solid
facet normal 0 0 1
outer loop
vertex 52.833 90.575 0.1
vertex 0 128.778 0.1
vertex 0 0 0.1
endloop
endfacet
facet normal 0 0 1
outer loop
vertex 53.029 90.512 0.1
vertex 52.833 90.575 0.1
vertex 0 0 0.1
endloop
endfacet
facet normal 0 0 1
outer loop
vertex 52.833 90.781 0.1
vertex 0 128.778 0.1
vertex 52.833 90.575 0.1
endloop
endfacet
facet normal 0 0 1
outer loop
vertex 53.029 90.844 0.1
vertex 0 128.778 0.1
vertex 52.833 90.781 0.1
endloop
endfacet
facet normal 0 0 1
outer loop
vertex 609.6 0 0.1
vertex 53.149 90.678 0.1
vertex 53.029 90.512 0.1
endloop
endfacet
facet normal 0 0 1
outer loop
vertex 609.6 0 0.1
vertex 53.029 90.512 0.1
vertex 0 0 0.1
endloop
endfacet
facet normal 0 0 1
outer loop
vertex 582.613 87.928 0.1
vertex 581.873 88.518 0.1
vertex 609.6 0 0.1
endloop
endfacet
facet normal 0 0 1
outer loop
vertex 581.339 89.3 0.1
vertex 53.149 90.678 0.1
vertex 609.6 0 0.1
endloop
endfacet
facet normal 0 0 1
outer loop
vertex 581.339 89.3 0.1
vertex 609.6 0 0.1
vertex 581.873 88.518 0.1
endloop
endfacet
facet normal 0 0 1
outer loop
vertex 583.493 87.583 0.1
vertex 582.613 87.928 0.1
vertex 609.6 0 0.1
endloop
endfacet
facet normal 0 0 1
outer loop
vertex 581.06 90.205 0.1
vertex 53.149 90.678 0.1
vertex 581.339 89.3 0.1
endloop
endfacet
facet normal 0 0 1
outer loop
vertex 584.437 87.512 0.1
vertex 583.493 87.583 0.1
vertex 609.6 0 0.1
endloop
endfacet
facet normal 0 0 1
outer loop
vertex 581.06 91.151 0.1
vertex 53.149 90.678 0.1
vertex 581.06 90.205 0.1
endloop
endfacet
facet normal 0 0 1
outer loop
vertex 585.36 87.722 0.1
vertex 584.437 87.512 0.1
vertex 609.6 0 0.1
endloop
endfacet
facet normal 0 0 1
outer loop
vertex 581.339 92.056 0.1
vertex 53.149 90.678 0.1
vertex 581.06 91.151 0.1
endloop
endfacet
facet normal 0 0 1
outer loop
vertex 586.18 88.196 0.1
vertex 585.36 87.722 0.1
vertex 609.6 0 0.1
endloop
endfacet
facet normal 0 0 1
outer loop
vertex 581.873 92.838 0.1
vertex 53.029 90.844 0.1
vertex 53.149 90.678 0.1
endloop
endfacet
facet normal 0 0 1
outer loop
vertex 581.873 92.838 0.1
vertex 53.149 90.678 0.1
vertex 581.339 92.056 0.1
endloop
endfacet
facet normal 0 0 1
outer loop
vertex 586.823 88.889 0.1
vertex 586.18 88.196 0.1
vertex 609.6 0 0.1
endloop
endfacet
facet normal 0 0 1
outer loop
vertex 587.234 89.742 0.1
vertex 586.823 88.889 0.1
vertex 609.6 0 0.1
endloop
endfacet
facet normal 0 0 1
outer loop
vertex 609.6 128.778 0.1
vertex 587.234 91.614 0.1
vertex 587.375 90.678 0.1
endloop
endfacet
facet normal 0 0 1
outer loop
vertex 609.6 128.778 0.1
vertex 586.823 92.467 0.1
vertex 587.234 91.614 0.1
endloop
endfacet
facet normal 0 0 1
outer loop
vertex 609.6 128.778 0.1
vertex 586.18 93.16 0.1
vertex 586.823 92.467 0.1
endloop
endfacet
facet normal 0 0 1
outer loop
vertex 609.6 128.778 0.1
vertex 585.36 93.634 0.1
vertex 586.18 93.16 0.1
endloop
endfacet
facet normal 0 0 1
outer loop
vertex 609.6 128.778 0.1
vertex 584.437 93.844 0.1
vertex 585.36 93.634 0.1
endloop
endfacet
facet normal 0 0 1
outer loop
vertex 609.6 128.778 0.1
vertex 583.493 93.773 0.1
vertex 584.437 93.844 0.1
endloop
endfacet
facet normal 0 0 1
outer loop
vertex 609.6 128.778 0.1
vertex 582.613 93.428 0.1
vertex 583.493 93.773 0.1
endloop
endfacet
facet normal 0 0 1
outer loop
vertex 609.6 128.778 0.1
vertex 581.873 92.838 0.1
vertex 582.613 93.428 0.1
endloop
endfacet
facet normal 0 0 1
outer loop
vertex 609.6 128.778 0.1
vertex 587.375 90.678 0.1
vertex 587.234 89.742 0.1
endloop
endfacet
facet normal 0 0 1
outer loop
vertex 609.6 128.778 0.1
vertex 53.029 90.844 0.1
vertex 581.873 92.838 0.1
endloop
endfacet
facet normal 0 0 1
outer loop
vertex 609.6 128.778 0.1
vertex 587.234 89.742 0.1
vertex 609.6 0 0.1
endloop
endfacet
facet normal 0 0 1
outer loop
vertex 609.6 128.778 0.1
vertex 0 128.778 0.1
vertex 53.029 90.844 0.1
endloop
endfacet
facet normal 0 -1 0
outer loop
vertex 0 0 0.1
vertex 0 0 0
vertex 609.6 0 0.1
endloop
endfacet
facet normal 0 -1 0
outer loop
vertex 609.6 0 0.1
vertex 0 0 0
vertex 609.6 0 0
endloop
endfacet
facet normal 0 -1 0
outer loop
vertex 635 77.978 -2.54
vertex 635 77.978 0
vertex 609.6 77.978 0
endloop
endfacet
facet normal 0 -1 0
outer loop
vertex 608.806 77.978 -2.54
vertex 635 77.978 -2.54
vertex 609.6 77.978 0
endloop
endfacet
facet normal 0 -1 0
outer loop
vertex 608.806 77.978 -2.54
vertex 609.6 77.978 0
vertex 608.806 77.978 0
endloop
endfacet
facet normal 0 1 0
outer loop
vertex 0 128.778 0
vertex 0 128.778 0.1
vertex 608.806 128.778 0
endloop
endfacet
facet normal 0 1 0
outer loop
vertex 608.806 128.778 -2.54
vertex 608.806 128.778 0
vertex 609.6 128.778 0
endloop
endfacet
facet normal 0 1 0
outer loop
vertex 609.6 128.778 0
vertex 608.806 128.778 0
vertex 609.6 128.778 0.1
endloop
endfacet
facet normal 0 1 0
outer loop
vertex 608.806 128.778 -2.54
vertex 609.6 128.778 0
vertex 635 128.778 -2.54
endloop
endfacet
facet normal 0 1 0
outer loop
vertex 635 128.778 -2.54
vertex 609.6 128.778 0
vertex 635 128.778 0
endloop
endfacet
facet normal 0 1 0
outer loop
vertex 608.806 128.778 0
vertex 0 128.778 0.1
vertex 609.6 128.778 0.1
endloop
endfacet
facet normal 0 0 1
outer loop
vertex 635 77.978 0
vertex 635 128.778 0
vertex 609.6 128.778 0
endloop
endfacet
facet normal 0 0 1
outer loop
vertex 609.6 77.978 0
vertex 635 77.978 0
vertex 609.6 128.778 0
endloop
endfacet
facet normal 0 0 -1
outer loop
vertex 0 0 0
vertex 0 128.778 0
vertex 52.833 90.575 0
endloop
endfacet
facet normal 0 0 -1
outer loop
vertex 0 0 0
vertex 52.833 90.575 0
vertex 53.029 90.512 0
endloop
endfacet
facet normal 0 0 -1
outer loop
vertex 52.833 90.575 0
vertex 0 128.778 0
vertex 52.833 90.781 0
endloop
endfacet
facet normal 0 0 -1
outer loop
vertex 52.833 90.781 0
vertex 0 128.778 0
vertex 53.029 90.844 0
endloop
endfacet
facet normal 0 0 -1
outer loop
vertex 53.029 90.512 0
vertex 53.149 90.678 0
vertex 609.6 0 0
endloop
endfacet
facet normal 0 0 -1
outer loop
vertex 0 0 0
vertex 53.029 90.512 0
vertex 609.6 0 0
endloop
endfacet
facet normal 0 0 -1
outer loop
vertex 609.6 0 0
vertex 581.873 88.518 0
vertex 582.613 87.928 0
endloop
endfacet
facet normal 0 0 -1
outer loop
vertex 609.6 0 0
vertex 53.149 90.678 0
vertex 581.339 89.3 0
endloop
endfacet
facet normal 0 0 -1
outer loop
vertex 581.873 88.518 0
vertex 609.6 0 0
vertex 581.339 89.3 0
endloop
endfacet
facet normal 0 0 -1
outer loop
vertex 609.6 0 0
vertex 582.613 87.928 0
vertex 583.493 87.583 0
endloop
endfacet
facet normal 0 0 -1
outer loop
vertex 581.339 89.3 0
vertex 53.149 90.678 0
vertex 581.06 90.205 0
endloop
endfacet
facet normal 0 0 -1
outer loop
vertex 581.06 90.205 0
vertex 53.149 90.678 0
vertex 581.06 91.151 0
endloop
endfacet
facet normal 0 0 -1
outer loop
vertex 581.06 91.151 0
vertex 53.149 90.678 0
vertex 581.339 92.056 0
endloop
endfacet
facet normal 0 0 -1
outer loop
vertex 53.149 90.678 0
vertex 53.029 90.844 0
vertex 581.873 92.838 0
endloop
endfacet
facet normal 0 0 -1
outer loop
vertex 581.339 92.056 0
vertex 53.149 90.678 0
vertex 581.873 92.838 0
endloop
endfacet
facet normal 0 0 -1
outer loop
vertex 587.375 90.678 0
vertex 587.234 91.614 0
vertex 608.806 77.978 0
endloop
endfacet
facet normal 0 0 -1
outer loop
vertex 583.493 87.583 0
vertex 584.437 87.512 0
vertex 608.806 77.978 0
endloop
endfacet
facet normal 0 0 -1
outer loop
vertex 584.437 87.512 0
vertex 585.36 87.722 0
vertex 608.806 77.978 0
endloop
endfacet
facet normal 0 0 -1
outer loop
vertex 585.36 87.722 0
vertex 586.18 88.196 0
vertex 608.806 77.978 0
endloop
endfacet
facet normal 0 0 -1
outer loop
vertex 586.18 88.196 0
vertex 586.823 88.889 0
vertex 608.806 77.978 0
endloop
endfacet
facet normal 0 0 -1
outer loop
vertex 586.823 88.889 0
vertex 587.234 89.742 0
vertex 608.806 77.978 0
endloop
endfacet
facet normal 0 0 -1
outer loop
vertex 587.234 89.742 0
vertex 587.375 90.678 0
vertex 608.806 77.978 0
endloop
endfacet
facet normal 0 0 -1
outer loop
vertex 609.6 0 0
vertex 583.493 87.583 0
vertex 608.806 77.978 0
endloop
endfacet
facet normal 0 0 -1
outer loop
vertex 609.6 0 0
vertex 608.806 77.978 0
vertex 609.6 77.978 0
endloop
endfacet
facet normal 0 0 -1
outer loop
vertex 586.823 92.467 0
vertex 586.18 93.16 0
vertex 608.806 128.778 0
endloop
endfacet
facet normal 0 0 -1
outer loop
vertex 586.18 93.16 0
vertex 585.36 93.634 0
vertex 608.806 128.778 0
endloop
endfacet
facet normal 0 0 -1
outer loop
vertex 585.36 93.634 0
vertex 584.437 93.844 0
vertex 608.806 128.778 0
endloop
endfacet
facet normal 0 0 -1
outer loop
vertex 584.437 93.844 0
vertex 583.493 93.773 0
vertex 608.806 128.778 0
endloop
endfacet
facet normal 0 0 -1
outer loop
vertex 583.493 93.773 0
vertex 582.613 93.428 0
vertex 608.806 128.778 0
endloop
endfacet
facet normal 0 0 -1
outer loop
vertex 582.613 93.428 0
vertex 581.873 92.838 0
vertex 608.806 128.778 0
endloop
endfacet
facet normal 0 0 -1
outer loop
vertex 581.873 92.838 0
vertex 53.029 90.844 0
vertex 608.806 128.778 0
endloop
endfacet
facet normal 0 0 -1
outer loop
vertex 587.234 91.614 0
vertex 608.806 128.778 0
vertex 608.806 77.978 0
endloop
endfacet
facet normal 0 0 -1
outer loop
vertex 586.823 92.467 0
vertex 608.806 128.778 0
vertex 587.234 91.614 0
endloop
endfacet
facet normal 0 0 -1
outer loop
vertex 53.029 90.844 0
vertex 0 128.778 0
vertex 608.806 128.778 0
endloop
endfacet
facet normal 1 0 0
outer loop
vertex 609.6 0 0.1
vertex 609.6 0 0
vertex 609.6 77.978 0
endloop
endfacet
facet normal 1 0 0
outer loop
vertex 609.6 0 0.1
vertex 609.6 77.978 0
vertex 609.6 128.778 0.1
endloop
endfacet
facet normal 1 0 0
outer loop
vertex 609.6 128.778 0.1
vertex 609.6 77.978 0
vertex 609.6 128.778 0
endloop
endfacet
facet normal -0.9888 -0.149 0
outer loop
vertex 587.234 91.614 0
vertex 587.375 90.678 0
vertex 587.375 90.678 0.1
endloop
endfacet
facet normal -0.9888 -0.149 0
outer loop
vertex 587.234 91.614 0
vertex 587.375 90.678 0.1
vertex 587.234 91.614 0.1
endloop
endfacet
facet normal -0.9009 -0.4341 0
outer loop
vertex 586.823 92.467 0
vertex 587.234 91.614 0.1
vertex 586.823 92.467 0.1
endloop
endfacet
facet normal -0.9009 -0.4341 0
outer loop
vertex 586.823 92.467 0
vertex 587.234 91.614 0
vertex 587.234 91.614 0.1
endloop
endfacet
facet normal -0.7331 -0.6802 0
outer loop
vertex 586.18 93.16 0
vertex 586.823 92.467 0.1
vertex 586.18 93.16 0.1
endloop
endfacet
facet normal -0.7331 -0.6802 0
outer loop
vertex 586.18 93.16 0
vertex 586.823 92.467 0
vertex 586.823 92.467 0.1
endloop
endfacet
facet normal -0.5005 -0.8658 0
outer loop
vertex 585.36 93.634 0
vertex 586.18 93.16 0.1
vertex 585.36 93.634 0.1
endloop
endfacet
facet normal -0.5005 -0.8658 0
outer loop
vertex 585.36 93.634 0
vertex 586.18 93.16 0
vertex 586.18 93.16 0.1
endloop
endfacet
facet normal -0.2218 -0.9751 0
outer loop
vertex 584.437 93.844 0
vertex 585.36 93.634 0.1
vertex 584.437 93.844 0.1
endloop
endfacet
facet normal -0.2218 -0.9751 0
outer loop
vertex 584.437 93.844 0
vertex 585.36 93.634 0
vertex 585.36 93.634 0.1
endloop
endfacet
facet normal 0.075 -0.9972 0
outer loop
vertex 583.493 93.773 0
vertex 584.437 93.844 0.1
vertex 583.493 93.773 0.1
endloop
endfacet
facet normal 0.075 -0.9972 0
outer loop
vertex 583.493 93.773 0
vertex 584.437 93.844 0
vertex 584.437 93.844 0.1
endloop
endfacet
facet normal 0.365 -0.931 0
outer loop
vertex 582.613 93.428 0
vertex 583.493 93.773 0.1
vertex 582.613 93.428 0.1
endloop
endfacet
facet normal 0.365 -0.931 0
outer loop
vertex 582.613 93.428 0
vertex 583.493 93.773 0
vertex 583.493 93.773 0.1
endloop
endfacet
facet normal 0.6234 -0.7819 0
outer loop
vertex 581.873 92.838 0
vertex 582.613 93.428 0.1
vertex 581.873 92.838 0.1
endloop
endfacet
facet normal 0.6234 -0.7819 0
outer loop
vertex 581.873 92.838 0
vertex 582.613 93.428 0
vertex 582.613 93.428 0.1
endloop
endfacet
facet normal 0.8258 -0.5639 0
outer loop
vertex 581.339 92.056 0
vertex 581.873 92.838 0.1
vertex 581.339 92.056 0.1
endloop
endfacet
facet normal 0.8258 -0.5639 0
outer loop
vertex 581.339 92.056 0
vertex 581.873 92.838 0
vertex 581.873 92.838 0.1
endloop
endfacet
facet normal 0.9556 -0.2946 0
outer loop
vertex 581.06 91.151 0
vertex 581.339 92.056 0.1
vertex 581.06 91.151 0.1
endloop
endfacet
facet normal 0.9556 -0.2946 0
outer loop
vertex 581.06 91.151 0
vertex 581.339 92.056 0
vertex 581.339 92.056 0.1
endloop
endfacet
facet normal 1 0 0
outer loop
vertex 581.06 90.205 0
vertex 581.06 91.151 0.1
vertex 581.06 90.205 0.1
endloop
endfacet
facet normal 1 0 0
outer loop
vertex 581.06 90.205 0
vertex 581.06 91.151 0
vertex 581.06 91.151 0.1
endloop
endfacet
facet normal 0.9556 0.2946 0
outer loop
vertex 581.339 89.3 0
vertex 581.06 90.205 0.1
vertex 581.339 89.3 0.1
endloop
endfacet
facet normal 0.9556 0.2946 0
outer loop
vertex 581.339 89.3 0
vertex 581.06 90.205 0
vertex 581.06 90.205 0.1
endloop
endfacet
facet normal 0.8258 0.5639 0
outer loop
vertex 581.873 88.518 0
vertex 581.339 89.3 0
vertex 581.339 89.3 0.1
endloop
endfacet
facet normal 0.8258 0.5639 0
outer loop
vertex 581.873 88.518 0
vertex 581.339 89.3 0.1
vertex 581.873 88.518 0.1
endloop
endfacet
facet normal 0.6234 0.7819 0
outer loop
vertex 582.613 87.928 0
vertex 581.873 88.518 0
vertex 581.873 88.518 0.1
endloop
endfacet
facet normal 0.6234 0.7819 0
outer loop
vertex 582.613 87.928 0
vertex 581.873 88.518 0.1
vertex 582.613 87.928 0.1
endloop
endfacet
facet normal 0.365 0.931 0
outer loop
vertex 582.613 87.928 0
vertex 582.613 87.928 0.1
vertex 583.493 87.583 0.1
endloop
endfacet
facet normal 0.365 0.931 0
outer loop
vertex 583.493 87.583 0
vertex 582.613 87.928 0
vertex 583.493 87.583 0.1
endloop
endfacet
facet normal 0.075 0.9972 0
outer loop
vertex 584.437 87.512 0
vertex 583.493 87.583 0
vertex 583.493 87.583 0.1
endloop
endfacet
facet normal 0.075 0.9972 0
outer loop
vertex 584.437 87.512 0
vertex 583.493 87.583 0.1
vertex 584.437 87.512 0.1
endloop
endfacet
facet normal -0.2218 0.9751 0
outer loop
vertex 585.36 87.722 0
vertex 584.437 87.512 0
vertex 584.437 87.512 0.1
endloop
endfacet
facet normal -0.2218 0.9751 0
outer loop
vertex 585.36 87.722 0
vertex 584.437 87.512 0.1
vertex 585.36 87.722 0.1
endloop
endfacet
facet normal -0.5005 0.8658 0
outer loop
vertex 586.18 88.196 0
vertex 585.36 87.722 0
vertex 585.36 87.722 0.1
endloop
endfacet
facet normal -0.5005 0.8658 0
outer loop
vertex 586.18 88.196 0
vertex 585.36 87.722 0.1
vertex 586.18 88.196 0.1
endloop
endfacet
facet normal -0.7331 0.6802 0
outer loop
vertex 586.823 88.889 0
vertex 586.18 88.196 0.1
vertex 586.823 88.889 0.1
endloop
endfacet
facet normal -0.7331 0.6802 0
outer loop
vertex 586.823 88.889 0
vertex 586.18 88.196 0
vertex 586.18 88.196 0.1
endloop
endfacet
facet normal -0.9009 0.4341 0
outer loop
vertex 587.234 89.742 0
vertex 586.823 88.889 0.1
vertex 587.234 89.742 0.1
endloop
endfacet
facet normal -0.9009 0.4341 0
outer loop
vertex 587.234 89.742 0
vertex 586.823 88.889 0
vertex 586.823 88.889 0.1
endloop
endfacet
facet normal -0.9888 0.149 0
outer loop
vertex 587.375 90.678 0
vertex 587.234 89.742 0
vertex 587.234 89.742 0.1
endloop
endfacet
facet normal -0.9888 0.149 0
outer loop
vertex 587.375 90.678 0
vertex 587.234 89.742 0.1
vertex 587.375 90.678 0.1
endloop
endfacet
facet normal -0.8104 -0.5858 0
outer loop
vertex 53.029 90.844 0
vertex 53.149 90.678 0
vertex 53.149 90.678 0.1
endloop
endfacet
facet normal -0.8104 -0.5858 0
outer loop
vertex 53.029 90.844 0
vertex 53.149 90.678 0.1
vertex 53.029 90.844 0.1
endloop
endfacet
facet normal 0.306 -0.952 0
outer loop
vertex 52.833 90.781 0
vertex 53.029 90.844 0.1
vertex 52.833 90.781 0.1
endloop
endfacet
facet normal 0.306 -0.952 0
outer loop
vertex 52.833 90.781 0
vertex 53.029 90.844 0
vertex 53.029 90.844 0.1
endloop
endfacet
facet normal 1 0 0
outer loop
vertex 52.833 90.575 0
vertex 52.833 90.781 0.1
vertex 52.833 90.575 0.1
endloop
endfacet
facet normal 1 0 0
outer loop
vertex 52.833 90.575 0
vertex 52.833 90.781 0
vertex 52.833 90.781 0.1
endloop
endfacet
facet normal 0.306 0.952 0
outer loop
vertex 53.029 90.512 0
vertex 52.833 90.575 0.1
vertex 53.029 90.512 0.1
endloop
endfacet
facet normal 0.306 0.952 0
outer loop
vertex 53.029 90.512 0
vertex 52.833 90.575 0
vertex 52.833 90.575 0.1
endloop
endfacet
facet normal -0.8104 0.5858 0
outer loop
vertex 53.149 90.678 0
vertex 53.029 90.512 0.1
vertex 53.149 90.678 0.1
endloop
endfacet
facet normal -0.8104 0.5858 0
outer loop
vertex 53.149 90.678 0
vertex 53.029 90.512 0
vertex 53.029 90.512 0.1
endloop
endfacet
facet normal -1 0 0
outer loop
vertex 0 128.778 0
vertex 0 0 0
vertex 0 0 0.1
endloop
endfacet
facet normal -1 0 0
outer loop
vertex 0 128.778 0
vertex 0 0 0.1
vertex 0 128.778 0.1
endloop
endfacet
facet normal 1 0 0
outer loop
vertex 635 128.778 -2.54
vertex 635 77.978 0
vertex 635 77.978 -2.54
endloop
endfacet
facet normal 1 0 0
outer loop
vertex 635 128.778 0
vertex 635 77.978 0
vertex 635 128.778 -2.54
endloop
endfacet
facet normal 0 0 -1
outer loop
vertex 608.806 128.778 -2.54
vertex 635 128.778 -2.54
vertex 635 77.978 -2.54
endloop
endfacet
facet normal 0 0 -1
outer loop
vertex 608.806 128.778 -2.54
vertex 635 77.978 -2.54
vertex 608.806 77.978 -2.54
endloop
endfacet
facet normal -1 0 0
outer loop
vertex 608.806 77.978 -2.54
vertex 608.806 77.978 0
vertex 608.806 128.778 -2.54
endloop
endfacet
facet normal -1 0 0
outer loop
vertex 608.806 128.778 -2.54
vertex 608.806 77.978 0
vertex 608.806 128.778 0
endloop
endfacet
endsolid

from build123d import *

# Parameters (mm, degrees)
SKETCH1_W           = 609.6
SKETCH1_H           = 128.778
SKETCH1_R           = 0.174798991
SKETCH1_R_2         = 3.175
BOSS_EXTRUDE1_DEPTH = 0.0999998
SKETCH2_W           = 25.4
SKETCH2_H           = 50.8
SKETCH2_W_2         = 0.79375
BOSS_EXTRUDE2_DEPTH = 2.54


with BuildPart() as part:
    # Sketch1 → Boss-Extrude1 (new body)
    with BuildSketch(Plane.XY):
        with Locations((304.8, 64.389)):
            Rectangle(SKETCH1_W, SKETCH1_H)
        with Locations((52.974692136, 90.678)):
            Circle(SKETCH1_R, mode=Mode.SUBTRACT)
        with Locations((584.2, 90.678)):
            Circle(SKETCH1_R_2, mode=Mode.SUBTRACT)
    extrude(amount=BOSS_EXTRUDE1_DEPTH)

    # Sketch2 → Boss-Extrude2 (add)
    with BuildSketch(Plane(origin=(0, 0, 0), x_dir=(-1, 0, 0), z_dir=(0, 0, -1))):
        with Locations((-622.3, 103.378)):
            Rectangle(SKETCH2_W, SKETCH2_H)
        with Locations((-609.203125, 103.378)):
            Rectangle(SKETCH2_W_2, SKETCH2_H)
    extrude(amount=BOSS_EXTRUDE2_DEPTH)


solid = part.part
